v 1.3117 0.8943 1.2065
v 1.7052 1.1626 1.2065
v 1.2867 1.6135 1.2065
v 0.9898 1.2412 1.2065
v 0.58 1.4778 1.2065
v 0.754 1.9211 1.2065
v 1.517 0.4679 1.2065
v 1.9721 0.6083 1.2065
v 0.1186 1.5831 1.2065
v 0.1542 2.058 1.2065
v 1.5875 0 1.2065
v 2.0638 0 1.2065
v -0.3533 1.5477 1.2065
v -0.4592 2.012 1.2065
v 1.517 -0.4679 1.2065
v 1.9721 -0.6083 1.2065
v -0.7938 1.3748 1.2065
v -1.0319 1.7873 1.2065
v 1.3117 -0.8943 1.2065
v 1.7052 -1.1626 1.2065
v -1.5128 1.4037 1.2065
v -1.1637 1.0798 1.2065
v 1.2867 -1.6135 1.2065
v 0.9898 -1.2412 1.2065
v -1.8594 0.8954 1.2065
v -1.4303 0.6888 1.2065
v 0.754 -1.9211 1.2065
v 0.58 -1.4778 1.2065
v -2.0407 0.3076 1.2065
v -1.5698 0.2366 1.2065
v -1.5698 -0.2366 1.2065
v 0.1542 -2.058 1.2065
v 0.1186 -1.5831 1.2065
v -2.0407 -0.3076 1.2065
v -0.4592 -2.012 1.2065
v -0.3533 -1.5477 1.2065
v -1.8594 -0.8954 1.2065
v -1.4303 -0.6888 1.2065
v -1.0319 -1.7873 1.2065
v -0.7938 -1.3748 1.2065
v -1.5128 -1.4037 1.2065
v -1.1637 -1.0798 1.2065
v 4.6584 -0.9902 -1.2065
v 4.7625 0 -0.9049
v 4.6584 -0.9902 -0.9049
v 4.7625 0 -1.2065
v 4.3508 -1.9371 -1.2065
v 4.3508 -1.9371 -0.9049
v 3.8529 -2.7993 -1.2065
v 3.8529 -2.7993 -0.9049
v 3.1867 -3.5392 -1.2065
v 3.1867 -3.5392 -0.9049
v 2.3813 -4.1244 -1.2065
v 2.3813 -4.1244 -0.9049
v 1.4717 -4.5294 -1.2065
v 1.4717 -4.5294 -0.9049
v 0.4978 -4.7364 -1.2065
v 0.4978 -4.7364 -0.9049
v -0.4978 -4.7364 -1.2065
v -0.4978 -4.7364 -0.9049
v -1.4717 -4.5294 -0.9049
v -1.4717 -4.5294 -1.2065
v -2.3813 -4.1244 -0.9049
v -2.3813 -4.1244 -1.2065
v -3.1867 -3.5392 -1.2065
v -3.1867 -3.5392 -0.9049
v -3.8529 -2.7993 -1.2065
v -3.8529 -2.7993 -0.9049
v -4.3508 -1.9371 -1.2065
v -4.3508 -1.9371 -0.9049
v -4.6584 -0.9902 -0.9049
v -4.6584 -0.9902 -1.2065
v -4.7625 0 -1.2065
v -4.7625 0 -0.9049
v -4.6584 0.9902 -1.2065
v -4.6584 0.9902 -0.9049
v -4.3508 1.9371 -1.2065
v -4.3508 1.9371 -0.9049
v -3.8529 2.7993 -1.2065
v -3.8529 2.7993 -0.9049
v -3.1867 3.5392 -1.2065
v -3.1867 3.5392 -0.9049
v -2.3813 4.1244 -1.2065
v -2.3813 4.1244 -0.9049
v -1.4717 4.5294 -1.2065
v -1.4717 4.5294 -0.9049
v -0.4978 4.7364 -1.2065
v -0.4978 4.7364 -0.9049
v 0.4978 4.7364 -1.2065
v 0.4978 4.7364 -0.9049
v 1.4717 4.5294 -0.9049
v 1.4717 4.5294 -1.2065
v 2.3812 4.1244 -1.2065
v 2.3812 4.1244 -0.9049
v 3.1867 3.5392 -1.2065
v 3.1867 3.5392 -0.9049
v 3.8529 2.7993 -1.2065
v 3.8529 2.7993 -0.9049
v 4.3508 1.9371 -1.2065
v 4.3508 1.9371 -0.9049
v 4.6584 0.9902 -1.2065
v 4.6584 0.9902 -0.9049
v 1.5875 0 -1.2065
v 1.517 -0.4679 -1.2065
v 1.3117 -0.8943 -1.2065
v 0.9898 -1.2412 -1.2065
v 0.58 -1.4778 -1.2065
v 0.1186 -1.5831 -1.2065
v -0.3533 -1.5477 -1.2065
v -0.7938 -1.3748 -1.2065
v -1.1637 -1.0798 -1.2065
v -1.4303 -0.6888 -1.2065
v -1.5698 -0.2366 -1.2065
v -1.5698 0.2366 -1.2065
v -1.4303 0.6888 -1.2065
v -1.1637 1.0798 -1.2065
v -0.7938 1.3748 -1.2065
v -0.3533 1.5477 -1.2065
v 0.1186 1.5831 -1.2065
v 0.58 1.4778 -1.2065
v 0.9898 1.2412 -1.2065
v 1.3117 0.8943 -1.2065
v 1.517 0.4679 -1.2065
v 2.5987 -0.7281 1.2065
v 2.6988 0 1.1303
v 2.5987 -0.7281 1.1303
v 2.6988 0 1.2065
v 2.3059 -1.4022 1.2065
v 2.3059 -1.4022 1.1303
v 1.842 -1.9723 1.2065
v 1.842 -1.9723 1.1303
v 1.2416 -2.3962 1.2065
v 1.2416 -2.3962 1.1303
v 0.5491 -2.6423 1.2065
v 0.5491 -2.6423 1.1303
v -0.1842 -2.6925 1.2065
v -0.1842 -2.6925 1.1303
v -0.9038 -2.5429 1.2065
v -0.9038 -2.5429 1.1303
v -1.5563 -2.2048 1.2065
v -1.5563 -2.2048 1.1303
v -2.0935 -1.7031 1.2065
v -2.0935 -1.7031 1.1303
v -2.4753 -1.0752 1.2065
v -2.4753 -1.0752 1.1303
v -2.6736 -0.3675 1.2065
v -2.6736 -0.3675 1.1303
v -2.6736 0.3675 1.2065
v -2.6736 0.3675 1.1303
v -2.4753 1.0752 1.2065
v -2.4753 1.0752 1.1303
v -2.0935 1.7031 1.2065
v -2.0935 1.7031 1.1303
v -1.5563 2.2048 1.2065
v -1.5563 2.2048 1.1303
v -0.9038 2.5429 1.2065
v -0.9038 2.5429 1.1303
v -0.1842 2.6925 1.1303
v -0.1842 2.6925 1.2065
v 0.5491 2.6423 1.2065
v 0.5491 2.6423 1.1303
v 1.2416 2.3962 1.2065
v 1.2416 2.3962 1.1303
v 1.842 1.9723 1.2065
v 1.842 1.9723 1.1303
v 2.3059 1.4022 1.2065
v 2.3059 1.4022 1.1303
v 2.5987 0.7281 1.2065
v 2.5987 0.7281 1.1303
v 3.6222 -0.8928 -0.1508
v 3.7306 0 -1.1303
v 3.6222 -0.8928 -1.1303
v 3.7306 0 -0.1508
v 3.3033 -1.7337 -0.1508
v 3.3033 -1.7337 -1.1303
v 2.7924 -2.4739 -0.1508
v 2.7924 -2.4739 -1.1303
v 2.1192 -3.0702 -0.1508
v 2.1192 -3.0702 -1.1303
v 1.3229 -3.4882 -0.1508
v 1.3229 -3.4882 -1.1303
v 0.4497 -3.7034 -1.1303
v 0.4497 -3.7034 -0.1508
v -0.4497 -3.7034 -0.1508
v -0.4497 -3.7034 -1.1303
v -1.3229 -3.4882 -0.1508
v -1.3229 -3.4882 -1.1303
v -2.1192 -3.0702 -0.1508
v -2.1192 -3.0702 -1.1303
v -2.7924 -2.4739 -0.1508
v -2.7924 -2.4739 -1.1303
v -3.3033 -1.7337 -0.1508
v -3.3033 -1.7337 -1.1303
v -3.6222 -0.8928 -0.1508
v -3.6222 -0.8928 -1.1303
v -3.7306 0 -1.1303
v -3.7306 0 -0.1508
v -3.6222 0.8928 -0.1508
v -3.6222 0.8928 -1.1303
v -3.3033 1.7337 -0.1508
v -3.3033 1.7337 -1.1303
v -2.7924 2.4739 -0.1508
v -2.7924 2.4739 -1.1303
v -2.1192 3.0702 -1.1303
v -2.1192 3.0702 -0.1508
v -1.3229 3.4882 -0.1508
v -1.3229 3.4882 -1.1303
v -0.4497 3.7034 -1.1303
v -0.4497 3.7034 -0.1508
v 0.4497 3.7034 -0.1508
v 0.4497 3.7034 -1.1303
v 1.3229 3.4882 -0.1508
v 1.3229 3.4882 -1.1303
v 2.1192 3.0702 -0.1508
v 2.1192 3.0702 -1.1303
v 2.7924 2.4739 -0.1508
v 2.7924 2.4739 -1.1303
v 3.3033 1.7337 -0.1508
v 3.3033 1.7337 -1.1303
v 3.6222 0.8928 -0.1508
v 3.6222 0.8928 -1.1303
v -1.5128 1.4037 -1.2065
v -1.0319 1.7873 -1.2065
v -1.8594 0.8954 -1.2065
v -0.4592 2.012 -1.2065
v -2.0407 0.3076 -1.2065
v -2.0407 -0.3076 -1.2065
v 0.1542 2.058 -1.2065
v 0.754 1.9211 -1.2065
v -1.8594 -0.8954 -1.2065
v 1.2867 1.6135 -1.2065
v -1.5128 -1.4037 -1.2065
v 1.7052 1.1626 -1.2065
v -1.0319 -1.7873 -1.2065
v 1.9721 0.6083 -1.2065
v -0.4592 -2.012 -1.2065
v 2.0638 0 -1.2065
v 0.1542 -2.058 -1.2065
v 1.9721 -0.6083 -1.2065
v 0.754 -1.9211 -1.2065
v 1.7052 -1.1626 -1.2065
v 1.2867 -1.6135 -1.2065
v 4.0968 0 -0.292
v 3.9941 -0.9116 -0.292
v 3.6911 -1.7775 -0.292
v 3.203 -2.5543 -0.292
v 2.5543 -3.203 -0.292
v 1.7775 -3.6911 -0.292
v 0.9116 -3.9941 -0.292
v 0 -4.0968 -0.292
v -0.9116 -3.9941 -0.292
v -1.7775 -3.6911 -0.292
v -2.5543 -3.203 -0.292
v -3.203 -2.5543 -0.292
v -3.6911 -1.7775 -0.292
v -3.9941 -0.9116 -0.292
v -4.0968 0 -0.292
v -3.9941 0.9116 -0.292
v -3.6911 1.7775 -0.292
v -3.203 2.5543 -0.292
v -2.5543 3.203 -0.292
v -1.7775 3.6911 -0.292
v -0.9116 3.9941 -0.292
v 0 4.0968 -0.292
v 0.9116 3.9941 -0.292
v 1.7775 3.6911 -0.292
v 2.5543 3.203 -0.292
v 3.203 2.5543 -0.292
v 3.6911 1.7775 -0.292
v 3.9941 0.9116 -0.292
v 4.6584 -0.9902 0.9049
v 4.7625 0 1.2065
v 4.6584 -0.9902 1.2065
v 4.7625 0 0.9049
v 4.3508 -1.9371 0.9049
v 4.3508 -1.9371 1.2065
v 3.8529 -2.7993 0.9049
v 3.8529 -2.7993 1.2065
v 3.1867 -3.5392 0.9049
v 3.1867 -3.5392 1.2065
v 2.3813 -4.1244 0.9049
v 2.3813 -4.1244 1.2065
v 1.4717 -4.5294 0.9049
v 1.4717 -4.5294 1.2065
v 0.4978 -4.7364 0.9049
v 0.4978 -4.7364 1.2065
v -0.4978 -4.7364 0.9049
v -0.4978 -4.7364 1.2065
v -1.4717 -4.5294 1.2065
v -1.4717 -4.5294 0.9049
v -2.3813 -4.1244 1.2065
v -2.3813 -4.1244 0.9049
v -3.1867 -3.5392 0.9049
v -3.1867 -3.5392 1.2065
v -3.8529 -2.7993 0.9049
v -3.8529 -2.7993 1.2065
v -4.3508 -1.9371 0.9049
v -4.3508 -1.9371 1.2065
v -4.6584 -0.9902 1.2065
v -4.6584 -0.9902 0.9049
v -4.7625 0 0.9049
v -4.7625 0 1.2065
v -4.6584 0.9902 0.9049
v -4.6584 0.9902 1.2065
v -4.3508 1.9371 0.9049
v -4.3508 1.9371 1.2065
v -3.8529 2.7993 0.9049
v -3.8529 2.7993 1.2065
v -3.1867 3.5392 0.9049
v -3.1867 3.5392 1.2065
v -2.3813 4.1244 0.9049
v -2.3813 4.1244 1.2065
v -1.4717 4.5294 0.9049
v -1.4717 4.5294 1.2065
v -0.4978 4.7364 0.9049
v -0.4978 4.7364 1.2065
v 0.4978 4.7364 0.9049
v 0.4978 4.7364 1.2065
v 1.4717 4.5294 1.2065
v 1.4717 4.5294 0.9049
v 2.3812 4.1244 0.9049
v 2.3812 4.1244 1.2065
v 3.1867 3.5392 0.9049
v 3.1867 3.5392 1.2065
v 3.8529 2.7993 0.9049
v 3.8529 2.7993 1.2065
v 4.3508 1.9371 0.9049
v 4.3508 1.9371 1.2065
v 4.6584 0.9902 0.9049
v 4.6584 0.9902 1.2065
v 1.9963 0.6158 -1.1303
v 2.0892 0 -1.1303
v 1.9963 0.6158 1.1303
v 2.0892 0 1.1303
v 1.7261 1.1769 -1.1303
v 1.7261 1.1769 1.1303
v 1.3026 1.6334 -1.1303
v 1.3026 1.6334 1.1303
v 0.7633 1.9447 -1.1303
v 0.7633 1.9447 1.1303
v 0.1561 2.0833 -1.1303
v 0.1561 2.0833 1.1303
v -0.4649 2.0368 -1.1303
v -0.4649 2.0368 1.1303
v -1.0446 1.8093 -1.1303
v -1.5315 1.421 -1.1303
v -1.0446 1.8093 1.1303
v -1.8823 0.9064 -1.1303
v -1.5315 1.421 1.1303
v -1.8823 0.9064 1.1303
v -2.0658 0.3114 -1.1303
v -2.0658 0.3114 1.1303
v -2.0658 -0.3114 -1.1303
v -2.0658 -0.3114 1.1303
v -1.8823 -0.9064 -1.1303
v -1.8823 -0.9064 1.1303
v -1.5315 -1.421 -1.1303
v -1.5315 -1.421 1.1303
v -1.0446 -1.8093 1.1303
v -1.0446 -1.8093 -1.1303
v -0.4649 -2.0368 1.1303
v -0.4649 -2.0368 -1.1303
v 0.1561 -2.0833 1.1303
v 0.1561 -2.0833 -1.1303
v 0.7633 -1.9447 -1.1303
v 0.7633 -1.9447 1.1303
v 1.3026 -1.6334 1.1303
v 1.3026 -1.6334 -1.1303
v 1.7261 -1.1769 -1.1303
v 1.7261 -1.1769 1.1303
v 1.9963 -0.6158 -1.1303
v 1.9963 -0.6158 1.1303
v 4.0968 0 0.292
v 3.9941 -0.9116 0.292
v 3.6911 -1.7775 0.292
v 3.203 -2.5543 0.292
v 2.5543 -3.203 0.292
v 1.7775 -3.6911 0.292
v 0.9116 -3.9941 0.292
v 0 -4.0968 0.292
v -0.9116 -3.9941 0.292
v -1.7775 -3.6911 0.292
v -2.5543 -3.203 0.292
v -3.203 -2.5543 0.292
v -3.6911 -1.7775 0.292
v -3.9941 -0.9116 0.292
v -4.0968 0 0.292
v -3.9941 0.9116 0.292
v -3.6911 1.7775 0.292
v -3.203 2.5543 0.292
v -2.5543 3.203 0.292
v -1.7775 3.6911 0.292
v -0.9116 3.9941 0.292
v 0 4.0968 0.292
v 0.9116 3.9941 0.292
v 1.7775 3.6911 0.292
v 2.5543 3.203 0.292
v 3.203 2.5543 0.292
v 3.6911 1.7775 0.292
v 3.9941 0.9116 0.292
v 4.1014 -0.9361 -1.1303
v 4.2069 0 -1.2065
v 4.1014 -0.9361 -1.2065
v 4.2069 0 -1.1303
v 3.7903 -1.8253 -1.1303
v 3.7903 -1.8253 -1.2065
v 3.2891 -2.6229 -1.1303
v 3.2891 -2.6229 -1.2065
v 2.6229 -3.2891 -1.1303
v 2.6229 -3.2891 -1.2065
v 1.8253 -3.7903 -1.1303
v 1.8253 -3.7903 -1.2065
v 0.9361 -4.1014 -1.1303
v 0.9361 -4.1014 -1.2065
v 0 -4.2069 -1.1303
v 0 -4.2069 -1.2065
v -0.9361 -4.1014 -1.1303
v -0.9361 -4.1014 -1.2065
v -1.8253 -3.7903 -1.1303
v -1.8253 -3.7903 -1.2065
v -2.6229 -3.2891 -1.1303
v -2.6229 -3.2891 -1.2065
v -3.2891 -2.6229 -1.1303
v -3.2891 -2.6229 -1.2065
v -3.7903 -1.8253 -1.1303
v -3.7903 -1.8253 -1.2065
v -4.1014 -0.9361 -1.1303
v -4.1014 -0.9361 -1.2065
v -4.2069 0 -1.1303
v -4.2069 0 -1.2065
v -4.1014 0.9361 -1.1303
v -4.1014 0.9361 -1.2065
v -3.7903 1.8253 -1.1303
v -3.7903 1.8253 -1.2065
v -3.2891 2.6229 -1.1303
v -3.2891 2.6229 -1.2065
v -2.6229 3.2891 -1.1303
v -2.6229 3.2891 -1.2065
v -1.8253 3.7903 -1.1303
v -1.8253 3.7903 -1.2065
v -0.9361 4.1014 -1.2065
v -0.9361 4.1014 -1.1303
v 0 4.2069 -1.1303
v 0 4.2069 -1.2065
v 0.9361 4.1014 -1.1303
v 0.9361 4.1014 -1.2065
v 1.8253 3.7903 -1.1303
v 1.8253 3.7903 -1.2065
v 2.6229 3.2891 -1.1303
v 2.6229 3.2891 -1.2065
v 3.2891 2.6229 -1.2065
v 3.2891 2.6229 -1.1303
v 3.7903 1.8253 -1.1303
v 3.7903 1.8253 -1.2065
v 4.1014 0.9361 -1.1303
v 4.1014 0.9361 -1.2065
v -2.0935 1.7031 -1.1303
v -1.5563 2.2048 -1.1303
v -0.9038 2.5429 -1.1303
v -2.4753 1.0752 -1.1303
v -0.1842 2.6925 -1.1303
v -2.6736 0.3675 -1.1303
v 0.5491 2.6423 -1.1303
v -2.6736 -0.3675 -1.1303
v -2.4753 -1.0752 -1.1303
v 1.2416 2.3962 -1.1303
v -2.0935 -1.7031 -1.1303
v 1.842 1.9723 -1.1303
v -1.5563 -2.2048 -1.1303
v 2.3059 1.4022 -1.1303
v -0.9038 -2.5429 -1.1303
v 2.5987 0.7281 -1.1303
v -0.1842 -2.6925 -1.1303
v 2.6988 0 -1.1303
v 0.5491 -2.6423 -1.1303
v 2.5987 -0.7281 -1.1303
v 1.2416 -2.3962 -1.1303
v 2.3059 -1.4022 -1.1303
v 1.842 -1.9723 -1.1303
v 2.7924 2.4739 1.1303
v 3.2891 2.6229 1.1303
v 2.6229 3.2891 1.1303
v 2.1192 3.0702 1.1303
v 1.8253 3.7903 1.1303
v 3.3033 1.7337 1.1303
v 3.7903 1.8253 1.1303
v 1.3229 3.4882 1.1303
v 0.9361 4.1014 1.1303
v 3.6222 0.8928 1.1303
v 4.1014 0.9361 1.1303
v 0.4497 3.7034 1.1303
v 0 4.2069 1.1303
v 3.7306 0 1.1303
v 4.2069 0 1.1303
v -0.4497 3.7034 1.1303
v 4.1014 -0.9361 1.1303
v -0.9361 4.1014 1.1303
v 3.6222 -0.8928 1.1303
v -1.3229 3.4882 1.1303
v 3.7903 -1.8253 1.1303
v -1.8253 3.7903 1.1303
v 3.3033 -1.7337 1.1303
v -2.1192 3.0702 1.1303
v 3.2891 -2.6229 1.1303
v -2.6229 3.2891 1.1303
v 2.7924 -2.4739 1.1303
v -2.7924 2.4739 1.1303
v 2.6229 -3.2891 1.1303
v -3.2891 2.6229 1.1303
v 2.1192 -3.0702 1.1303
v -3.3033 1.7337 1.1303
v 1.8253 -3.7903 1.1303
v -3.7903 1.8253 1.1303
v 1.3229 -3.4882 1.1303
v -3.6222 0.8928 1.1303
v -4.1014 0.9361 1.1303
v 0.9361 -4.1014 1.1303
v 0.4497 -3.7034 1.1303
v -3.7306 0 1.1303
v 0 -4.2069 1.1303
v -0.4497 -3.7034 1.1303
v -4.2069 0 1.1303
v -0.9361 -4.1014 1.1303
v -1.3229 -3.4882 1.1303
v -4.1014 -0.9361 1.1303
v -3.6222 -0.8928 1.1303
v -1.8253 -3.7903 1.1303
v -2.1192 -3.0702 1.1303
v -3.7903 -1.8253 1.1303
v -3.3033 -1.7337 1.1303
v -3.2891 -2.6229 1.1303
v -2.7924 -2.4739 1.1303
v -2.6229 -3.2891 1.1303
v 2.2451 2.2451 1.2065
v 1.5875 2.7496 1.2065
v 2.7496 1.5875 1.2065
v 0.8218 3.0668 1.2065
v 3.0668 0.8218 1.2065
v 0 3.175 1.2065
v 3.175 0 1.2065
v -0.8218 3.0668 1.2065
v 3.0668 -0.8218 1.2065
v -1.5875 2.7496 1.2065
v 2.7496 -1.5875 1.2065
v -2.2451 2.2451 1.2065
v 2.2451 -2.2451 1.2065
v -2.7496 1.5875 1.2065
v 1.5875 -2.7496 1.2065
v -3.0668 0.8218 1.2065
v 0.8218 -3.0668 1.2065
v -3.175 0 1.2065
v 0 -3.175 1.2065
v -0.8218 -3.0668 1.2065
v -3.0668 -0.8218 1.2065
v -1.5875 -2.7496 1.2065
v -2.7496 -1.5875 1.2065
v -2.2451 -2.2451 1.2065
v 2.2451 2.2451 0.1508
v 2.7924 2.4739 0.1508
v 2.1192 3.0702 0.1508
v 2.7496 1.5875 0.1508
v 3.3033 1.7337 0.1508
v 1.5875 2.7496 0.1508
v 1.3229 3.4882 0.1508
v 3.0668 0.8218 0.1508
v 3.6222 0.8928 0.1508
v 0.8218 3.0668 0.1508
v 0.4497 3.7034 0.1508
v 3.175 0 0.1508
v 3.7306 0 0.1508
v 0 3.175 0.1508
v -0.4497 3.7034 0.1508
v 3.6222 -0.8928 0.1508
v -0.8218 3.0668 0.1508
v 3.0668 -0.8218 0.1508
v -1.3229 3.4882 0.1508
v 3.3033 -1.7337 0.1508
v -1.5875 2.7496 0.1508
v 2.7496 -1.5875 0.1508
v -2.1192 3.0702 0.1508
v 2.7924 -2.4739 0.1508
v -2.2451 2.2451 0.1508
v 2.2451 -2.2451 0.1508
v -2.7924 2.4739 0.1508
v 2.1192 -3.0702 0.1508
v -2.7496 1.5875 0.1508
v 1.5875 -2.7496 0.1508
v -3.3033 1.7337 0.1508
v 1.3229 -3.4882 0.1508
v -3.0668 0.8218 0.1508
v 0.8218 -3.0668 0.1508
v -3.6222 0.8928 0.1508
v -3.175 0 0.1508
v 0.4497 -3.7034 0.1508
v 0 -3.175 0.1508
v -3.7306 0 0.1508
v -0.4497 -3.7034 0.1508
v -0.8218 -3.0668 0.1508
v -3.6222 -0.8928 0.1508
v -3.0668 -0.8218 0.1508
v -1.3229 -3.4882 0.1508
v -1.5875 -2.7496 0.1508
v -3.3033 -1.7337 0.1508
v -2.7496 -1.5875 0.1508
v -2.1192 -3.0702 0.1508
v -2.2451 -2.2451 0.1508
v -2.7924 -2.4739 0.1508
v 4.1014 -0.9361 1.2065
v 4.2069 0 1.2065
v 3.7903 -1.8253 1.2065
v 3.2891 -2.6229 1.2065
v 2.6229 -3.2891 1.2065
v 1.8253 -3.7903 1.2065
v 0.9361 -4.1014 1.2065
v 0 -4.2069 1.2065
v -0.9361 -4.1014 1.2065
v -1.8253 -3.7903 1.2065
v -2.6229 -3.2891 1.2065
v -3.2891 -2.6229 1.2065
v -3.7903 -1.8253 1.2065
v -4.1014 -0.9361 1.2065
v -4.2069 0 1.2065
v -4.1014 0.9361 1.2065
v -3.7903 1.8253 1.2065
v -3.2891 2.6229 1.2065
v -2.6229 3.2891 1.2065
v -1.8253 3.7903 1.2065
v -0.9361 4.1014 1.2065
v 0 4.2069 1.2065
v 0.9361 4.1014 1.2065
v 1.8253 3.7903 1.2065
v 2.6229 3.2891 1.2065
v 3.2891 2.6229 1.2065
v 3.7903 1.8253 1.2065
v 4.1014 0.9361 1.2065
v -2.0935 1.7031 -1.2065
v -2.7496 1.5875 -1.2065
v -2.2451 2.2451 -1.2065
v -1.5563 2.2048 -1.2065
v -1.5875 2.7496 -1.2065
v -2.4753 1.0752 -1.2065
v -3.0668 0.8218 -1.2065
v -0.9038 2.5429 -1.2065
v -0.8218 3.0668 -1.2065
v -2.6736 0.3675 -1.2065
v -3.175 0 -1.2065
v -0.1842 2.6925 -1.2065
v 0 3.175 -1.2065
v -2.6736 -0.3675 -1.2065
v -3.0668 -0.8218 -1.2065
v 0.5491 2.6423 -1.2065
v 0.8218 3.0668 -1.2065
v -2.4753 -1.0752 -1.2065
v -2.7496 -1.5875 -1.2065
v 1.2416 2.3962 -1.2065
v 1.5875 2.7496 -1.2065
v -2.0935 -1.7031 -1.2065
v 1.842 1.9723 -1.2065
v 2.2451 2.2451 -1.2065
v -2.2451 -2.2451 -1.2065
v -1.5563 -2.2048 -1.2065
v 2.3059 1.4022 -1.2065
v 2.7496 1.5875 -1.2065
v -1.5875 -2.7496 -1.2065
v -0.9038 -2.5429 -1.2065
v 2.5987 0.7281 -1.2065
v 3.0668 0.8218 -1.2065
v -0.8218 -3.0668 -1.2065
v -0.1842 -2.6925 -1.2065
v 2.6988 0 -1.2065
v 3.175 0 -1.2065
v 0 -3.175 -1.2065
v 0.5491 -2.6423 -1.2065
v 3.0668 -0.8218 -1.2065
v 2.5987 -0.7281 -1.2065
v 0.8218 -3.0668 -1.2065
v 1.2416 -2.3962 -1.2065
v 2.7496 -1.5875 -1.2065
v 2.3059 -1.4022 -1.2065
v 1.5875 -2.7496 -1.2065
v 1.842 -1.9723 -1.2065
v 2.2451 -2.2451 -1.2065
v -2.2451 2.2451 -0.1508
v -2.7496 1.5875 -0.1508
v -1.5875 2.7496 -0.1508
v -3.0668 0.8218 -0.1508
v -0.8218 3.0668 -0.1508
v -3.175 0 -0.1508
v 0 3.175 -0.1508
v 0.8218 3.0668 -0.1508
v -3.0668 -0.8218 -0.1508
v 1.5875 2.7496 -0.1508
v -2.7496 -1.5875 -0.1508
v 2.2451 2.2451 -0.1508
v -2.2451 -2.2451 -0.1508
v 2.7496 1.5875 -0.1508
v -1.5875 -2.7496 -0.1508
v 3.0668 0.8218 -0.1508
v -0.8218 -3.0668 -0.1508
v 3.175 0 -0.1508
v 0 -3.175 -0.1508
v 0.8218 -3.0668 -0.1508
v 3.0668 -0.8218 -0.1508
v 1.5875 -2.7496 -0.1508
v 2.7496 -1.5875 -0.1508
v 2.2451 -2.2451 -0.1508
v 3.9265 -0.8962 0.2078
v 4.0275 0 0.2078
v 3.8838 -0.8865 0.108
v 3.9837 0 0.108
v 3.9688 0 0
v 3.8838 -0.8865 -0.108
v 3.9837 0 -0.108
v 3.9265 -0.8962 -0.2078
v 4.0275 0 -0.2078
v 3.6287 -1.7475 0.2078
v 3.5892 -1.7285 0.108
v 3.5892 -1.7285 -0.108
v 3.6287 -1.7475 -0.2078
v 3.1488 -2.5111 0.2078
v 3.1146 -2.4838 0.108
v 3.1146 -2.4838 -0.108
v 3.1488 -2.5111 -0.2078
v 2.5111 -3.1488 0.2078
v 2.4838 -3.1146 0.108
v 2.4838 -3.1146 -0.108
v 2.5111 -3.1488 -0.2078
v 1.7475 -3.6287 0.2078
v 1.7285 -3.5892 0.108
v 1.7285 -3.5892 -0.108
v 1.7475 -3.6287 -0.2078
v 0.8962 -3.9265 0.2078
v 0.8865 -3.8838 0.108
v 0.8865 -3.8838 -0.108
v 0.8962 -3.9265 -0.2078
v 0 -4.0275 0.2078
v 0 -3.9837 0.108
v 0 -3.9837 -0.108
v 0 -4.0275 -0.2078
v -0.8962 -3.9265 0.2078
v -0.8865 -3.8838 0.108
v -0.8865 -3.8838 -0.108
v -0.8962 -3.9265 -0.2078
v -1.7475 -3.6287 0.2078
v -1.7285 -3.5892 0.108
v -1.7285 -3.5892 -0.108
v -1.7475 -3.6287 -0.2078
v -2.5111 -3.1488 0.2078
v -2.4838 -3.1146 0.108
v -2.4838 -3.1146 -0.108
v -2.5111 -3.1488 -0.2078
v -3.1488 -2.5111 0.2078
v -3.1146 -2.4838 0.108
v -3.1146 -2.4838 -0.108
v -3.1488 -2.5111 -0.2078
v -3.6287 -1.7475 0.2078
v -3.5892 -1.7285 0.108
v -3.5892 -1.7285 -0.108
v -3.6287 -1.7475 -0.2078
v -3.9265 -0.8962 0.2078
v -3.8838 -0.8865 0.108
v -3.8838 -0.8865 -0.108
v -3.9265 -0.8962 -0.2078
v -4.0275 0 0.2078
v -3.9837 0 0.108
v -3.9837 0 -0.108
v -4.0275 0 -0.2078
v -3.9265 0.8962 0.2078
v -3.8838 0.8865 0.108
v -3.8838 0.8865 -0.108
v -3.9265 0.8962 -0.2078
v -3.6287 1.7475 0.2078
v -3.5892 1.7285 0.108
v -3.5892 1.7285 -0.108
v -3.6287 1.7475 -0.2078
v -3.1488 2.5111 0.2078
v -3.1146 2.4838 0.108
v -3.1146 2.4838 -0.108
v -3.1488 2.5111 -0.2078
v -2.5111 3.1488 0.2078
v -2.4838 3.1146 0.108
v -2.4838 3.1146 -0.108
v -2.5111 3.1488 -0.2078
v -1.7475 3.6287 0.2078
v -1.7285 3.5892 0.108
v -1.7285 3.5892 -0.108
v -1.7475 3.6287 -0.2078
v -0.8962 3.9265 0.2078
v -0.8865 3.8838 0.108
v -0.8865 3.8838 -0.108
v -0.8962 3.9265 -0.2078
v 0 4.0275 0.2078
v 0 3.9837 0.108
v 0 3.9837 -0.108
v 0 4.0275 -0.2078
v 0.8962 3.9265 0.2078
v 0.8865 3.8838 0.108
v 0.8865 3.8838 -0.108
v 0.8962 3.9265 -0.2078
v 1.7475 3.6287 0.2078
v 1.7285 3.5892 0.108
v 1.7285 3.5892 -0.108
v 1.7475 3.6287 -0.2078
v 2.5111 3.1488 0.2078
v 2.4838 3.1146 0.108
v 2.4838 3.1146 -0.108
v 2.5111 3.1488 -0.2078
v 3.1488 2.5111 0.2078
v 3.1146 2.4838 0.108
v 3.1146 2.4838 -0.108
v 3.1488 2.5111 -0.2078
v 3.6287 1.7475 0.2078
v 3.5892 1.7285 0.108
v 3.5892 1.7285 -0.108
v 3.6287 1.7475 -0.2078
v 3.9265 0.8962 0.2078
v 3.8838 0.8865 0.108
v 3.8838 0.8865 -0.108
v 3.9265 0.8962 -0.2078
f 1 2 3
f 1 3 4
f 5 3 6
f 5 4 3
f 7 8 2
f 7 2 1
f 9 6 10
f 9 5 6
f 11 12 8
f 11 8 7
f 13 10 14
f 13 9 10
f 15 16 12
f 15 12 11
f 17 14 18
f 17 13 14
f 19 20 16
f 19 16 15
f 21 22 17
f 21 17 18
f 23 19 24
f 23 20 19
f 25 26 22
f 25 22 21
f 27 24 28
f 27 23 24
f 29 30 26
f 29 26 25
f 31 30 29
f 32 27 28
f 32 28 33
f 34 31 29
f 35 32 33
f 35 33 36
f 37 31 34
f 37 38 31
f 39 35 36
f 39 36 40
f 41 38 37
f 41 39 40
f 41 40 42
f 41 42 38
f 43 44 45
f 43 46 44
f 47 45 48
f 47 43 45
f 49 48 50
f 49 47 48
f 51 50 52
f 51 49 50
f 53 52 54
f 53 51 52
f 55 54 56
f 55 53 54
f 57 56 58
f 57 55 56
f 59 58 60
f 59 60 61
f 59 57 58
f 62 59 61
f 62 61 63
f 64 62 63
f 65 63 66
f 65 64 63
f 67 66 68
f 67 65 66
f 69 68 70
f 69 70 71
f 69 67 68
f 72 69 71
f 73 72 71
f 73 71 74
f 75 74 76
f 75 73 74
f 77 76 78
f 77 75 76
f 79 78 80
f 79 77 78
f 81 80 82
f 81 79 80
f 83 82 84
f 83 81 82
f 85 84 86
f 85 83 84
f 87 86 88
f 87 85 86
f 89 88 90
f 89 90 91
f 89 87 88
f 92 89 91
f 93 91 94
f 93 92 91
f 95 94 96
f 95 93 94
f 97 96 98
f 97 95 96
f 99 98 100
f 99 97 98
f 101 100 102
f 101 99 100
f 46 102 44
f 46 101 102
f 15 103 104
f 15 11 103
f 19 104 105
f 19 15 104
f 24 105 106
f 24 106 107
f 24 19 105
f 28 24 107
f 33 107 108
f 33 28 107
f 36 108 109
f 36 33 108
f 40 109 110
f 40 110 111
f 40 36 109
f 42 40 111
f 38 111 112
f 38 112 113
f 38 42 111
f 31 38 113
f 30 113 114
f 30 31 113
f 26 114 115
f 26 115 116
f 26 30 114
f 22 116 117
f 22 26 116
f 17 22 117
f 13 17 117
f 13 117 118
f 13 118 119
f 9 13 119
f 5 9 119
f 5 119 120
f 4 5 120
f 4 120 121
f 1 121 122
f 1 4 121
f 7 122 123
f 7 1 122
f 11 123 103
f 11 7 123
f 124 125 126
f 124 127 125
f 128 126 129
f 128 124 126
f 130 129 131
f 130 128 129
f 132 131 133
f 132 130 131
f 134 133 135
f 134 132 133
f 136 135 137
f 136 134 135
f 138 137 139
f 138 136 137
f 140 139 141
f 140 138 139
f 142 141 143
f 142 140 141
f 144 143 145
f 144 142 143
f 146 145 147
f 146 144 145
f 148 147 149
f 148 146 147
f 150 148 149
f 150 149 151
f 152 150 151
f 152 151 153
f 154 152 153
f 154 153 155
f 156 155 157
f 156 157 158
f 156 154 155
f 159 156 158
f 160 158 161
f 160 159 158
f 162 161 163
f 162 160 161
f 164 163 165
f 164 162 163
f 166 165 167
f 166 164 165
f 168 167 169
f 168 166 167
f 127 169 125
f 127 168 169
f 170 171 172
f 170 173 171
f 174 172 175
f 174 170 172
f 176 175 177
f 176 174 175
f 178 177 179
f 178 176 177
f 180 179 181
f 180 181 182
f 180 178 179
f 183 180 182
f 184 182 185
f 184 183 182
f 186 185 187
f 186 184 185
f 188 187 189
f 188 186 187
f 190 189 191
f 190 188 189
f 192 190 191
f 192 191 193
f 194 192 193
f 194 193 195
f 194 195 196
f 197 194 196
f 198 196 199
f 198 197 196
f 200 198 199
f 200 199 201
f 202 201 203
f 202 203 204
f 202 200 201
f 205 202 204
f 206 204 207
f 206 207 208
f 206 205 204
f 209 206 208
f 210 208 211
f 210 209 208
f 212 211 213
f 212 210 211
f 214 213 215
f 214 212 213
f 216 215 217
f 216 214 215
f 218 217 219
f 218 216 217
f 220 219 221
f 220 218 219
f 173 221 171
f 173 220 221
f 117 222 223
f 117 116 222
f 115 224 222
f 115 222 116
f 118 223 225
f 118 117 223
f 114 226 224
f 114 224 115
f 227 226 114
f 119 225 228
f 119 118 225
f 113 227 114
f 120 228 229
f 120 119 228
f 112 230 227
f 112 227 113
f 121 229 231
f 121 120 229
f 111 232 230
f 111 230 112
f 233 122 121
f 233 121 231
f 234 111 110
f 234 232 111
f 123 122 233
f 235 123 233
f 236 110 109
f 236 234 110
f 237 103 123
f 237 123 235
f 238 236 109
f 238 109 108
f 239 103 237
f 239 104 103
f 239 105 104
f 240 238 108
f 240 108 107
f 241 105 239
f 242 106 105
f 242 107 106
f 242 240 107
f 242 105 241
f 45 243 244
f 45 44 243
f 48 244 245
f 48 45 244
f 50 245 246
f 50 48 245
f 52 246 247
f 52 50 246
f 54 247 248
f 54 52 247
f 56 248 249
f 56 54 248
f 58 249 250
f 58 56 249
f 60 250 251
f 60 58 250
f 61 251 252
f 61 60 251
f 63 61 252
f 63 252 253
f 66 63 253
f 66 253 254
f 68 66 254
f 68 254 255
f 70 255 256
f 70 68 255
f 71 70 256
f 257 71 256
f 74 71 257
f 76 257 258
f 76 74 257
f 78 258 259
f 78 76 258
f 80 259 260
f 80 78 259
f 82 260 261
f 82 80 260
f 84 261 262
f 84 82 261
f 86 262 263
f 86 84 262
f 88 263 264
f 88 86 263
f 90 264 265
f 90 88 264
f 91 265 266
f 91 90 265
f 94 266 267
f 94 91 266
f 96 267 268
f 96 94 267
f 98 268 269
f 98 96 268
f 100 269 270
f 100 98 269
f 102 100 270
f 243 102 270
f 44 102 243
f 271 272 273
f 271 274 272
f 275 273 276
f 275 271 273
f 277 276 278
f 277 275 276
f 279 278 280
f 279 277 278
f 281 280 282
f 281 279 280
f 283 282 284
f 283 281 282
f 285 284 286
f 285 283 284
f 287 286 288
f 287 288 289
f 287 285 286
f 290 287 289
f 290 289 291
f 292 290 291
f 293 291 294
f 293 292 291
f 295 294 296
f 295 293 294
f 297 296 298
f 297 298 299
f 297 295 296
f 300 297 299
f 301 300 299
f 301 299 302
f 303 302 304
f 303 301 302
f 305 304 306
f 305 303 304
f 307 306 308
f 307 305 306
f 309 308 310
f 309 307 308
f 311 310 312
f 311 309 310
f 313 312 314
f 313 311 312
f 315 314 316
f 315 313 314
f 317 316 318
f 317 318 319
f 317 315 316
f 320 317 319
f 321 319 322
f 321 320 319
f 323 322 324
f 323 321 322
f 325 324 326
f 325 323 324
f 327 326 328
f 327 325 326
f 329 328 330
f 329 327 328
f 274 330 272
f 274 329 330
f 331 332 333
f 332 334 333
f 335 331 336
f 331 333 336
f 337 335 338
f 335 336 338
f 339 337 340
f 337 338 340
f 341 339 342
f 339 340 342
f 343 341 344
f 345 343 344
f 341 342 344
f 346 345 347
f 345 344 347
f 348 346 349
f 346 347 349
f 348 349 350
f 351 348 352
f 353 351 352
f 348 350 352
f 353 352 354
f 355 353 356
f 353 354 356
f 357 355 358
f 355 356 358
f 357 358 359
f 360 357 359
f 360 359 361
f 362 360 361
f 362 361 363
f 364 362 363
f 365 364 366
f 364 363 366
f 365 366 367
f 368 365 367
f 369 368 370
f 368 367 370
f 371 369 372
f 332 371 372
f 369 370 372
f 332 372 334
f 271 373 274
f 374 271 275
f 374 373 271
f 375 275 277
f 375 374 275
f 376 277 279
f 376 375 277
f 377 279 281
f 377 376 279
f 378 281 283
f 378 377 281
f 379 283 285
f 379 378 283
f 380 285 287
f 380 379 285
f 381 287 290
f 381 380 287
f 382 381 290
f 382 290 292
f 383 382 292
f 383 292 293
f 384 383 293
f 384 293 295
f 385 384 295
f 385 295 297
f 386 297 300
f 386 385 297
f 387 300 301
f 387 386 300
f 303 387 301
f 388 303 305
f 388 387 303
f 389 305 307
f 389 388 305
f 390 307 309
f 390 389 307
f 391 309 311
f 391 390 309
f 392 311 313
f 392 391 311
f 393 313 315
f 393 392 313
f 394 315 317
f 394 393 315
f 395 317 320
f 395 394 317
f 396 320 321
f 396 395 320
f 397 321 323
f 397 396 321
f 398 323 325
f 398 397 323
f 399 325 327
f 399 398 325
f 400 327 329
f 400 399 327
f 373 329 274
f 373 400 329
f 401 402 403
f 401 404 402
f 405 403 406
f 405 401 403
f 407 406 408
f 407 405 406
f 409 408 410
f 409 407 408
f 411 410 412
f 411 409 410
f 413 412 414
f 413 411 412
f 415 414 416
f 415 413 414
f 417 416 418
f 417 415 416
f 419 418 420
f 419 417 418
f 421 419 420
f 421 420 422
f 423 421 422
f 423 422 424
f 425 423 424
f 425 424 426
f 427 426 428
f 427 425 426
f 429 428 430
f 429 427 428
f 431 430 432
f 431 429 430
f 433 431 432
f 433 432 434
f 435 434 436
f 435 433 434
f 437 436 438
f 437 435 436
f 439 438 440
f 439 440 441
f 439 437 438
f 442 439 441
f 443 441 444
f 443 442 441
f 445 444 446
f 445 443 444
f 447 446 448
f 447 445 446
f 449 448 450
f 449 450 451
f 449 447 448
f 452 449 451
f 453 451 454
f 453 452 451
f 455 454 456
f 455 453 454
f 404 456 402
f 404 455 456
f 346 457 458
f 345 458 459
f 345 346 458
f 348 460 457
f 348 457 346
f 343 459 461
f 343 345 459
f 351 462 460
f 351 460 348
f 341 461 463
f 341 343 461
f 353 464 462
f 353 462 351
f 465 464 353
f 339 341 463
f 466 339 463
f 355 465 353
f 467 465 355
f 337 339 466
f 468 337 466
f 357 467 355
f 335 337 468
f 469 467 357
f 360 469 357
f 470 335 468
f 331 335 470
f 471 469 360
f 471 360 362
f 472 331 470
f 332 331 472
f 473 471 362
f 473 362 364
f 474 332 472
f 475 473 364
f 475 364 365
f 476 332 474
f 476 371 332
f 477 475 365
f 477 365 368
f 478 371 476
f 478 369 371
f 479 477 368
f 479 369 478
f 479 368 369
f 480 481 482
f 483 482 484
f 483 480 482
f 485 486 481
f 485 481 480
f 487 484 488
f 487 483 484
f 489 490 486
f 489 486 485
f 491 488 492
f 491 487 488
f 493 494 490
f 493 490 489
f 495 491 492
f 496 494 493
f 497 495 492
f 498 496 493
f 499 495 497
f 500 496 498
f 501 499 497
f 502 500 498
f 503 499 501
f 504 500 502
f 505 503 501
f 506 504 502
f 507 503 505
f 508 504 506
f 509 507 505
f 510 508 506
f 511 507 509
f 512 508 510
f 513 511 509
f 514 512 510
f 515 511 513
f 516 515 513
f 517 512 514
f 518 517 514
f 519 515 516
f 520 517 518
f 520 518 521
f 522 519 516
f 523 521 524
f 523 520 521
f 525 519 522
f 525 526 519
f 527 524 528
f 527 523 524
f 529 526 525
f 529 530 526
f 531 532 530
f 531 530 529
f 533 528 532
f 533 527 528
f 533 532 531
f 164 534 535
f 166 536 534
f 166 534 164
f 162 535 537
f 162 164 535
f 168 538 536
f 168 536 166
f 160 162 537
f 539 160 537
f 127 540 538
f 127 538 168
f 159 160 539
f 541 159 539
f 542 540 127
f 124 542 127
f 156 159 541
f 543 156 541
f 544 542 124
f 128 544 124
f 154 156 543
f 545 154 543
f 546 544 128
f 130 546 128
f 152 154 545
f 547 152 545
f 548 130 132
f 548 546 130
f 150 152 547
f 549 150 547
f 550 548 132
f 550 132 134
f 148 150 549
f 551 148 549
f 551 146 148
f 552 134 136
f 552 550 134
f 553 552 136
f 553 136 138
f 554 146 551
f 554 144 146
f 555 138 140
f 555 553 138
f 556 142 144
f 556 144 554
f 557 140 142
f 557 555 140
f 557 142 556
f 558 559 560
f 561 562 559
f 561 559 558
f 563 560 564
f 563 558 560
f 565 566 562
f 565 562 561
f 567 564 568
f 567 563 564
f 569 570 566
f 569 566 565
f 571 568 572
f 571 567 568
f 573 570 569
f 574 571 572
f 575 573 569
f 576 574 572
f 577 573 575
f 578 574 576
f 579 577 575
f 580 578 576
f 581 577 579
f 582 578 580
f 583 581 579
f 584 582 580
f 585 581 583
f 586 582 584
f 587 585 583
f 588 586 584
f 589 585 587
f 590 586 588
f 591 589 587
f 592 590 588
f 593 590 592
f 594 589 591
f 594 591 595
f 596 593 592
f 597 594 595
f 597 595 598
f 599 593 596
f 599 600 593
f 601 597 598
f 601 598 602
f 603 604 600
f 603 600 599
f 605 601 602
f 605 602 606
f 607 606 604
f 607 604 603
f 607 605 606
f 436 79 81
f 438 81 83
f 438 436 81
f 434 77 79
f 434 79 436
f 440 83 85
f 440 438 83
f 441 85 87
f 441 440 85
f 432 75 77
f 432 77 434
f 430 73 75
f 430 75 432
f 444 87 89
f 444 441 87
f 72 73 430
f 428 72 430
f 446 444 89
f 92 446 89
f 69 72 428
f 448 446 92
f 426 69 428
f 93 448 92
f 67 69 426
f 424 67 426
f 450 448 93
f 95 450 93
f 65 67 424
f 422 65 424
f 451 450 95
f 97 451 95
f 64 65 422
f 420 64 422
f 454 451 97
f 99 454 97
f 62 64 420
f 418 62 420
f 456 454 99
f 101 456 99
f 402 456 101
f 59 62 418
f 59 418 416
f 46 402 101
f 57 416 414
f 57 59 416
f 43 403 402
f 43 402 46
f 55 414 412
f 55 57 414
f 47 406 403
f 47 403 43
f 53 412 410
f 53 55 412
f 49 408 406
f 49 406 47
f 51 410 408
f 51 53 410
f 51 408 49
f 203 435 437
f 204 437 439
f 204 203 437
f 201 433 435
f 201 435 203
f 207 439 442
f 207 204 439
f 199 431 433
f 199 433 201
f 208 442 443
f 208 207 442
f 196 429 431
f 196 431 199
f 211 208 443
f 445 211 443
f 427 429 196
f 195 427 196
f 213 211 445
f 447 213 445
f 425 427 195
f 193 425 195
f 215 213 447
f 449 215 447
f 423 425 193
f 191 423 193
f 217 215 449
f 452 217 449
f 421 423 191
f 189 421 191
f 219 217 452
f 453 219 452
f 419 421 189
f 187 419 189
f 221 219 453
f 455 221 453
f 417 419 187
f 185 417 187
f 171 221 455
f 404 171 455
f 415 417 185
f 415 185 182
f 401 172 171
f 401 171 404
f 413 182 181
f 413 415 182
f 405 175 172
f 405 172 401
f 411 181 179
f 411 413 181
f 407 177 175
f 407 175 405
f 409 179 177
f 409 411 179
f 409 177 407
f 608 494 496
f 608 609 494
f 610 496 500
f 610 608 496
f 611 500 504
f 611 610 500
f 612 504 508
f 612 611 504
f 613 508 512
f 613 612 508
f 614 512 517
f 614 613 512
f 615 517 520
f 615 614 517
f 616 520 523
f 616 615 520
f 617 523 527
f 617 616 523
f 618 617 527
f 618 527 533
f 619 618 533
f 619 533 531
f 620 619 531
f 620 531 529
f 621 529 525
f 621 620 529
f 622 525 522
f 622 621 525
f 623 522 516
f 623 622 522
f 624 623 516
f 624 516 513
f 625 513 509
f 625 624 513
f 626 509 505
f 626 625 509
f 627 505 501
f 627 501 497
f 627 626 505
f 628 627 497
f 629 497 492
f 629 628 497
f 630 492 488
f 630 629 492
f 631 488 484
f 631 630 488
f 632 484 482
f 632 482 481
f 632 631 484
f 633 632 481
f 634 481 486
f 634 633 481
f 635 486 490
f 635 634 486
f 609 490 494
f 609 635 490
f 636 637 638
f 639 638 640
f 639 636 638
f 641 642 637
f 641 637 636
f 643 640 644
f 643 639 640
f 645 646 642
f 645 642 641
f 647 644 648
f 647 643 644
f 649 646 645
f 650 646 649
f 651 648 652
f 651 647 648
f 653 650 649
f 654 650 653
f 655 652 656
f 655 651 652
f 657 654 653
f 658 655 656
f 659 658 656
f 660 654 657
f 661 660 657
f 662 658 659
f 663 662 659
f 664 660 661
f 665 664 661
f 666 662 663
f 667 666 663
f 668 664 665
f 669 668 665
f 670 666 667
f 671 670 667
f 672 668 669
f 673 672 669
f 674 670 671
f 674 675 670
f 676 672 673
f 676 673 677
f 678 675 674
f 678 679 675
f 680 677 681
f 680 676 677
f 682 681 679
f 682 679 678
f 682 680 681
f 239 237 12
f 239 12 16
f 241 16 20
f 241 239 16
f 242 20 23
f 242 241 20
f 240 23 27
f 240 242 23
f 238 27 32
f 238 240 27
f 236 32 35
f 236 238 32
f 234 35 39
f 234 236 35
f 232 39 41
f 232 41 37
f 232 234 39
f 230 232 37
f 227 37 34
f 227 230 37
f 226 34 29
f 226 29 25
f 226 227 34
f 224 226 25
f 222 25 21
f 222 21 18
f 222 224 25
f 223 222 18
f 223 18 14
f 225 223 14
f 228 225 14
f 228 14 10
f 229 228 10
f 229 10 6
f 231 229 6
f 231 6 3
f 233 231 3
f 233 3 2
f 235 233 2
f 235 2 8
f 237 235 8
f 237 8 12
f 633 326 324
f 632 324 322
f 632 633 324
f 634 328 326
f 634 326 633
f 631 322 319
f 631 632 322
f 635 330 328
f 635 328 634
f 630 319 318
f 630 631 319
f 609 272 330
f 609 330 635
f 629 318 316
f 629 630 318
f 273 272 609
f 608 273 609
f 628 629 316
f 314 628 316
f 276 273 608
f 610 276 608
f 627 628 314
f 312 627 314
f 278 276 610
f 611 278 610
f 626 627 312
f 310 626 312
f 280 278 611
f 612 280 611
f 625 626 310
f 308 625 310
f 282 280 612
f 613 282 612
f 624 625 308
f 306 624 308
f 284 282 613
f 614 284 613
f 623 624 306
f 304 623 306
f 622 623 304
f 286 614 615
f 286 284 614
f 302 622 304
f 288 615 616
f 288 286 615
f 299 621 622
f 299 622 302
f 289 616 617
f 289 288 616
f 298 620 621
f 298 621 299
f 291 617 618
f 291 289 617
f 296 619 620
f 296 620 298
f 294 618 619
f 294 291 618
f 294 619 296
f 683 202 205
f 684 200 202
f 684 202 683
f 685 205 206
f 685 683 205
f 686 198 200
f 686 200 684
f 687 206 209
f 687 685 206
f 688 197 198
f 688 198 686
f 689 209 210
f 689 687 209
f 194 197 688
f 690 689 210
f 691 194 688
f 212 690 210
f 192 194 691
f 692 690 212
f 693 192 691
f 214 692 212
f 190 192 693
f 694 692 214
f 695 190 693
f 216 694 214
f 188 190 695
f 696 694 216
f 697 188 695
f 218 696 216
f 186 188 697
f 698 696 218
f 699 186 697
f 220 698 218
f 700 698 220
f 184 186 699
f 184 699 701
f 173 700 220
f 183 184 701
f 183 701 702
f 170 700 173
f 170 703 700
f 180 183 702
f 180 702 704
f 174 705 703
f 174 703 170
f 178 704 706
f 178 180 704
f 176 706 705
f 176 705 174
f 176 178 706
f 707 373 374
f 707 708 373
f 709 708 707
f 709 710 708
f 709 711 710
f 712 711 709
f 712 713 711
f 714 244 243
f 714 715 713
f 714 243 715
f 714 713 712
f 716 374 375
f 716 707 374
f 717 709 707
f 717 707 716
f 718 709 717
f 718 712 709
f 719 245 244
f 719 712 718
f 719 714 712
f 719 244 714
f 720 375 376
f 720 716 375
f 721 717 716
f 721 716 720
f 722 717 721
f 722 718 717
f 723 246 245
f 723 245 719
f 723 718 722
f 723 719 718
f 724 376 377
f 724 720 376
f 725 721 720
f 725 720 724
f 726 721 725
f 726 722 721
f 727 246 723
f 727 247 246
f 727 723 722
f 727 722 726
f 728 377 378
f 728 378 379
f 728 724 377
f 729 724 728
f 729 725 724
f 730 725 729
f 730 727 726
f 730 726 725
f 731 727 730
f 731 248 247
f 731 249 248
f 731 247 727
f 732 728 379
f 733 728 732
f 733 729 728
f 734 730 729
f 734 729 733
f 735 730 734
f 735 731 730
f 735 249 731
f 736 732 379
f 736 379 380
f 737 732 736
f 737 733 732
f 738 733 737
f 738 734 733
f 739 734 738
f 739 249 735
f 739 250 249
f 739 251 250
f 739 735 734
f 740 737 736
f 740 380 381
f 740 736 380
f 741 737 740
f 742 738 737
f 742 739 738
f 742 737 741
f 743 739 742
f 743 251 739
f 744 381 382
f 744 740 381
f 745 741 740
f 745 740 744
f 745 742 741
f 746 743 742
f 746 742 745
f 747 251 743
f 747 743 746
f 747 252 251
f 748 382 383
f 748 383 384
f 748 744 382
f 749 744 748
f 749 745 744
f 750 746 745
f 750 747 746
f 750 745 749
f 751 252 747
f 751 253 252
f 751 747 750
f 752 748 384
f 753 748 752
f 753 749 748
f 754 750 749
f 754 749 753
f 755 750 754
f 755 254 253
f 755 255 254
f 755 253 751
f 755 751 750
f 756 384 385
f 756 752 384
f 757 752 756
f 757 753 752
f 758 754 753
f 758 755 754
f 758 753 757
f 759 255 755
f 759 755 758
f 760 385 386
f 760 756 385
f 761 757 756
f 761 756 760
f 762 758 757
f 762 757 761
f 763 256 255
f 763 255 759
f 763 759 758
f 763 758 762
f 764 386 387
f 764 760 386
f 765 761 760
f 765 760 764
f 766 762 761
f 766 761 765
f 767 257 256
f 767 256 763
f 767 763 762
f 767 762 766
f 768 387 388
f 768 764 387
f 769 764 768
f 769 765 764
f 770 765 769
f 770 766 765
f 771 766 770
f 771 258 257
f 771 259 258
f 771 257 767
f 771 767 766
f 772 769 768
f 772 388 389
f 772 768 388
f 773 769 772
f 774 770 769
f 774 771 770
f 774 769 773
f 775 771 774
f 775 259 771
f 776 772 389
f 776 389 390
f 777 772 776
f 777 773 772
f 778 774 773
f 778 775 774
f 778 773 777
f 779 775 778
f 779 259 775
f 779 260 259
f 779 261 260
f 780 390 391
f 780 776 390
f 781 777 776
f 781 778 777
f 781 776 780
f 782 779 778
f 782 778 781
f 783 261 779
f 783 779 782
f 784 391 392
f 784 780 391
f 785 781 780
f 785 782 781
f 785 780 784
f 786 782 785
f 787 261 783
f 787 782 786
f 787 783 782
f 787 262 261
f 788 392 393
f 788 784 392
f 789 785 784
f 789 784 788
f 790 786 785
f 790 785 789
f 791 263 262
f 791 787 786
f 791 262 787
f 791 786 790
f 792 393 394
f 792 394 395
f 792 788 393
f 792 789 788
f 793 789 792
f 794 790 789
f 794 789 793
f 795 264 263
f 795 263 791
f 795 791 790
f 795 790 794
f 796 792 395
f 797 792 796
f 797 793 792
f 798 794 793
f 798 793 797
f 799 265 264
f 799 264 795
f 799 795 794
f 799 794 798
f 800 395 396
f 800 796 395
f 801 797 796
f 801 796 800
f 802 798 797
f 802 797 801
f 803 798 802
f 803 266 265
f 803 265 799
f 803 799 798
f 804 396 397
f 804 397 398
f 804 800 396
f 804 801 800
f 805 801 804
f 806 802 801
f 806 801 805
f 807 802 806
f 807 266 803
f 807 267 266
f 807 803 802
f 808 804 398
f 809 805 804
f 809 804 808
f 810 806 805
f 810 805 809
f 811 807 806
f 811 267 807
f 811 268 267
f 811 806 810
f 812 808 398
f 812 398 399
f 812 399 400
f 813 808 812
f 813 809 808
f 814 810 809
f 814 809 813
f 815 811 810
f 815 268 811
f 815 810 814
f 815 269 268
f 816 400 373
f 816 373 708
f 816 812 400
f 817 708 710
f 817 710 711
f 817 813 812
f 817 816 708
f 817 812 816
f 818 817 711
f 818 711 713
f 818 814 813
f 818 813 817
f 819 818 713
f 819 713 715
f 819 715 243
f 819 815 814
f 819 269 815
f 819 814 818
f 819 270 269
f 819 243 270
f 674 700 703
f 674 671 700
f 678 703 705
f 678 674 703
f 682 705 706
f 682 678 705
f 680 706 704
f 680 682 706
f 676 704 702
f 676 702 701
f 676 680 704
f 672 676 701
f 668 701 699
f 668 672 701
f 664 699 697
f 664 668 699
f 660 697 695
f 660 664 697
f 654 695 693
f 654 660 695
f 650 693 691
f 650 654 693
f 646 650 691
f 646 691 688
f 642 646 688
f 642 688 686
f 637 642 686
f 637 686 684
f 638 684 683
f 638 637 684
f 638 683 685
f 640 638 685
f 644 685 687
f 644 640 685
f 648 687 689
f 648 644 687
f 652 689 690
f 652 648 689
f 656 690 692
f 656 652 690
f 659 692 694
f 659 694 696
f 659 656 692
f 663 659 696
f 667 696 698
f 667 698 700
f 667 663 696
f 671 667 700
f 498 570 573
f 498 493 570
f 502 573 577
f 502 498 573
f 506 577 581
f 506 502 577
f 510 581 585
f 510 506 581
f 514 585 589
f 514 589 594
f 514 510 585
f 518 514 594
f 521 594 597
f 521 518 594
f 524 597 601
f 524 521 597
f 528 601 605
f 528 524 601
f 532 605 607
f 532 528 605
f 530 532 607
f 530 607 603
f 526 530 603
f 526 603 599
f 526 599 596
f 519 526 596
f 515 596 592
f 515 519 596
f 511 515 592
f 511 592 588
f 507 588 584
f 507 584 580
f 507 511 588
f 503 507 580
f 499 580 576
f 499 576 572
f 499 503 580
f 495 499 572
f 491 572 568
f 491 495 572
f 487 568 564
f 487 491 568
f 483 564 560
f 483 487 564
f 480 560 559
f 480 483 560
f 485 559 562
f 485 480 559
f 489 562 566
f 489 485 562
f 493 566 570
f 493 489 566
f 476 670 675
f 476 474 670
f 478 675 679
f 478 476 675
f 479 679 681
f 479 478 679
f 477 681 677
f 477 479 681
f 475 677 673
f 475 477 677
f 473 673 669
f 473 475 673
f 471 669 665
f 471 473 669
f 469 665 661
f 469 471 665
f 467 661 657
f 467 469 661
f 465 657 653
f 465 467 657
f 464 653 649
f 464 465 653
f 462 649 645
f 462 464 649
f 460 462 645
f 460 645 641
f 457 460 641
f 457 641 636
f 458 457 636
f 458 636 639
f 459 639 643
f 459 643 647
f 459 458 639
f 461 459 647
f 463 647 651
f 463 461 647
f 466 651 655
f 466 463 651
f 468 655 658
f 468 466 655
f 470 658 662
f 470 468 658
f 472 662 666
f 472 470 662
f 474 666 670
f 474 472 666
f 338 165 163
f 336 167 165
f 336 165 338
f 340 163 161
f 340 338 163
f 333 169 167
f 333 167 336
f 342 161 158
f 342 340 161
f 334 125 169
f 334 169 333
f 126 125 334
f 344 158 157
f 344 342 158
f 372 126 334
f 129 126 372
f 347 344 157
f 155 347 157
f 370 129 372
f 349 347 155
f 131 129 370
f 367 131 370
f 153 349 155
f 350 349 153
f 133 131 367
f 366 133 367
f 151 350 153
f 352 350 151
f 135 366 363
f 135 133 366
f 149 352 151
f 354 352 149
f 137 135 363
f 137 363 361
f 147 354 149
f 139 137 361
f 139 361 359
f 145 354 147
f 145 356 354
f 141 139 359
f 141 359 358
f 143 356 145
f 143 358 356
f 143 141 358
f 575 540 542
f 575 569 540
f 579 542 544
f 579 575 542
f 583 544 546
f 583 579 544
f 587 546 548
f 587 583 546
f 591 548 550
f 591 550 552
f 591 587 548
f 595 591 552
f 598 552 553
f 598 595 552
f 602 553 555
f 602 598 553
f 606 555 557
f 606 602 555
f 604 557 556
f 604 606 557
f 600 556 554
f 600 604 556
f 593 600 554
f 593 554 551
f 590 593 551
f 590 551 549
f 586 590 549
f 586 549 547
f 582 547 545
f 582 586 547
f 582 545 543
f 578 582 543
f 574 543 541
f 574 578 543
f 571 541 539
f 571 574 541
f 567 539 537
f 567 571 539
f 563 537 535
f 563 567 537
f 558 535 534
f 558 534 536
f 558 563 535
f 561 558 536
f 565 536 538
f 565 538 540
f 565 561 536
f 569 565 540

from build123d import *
from build123d.topology import SkipClean

# Parameters (mm, degrees)
CUT_EXTRUDE_THIN1_DEPTH      = 7.842401242
CUT_EXTRUDE_THIN1_DEPTH_BACK = 7.842401242
SKETCH2_R                    = 2.08915
SKETCH2_R_2                  = 2.06375


with BuildPart() as part:
    # Sketch1 → Revolve1 (revolve)
    with BuildSketch(Plane(origin=(0, 0, 0), x_dir=(0, 0, -1), z_dir=(1, 0, 0))):
        with BuildLine():
            Line((0.904875, 4.7625), (1.2065, 4.7625))
            Line((1.2065, 4.7625), (1.2065, 4.206875))
            Line((1.2065, 4.206875), (1.1303, 4.206875))
            Line((1.1303, 4.206875), (1.1303, 3.730625))
            Line((1.1303, 3.730625), (0.1508125, 3.730625))
            Line((0.1508125, 3.730625), (0.1508125, 3.175))
            Line((0.1508125, 3.175), (1.2065, 3.175))
            Line((1.2065, 3.175), (1.2065, 2.69875))
            Line((1.2065, 2.69875), (1.1303, 2.69875))
            Line((1.1303, 2.69875), (1.1303, 2.06375))
            Line((1.1303, 2.06375), (1.2065, 2.06375))
            Line((1.2065, 2.06375), (1.2065, 1.5875))
            Line((1.2065, 1.5875), (-1.2065, 1.5875))
            Line((-1.2065, 1.5875), (-1.2065, 2.06375))
            Line((-1.2065, 2.06375), (-1.1303, 2.06375))
            Line((-1.1303, 2.06375), (-1.1303, 2.69875))
            Line((-1.1303, 2.69875), (-1.2065, 2.69875))
            Line((-1.2065, 2.69875), (-1.2065, 3.175))
            Line((-1.2065, 3.175), (-0.1508125, 3.175))
            Line((-0.1508125, 3.175), (-0.1508125, 3.730625))
            Line((-0.1508125, 3.730625), (-1.1303, 3.730625))
            Line((-1.1303, 3.730625), (-1.1303, 4.206875))
            Line((-1.1303, 4.206875), (-1.2065, 4.206875))
            Line((-1.2065, 4.206875), (-1.2065, 4.7625))
            Line((-1.2065, 4.7625), (-0.904875, 4.7625))
            Line((-0.904875, 4.7625), (-0.291970509, 4.096807241))
            ThreePointArc((-0.291970509, 4.096807241), (0, 3.96875), (0.291970509, 4.096807241))
            Line((0.291970509, 4.096807241), (0.904875, 4.7625))
        make_face()
    revolve(axis=Axis((0, 0, 1.2065), (0, 0, -1)))

    # Sketch2 → Cut-Extrude-Thin1 (cut, two sides: drawn at the far end of the back side and taken through both)
    with SkipClean():  # the faces are left unmerged after this step: merging them gives an invalid solid
        with BuildSketch(Plane.XY.offset(-CUT_EXTRUDE_THIN1_DEPTH_BACK)):
            Circle(SKETCH2_R)
            Circle(SKETCH2_R_2, mode=Mode.SUBTRACT)
        extrude(amount=CUT_EXTRUDE_THIN1_DEPTH + CUT_EXTRUDE_THIN1_DEPTH_BACK, mode=Mode.SUBTRACT)


with BuildPart() as cut_extrude_thin1_piece_1:
    # of the separate pieces the step leaves, piece 1, a body of its own (cut_extrude_thin1_pieces)
    add(part.part.solids().sort_by_distance((0, 4.096807241, 0.291970509))[0])


with BuildPart() as cut_extrude_thin1_piece_2:
    # of the separate pieces the step leaves, piece 2, a body of its own (cut_extrude_thin1_pieces)
    add(part.part.solids().sort_by_distance((0, 2.06375, 1.2065))[0])


solid = Compound([cut_extrude_thin1_piece_1.part, cut_extrude_thin1_piece_2.part])
